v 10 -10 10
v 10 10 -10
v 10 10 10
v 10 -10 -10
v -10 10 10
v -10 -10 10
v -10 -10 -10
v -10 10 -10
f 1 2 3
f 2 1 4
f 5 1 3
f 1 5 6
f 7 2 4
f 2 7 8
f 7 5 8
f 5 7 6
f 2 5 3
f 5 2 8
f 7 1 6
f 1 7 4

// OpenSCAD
// Filename : Robot-2.scad
// Version  : v2.0
// Modified : 3 Sept 2016
// Author   : Jason Yeo
//////////////////////////////////////
// Basic car frame. (Base class)
//////////////////////////////////////
$fn=60;
robot();

module robot()
{
    head();
    //torso();
    //arms();
    //hsips();
    //legs();
}

//////////////////////////////////////////////////////////
// HEAD
//////////////////////////////////////////////////////////
module head(length=20, breadth=20, height=20)
{
    union()
    {
        cube([length, breadth, height],true);
        //rotate([90,0,0])cylinder(20,10,10, true);
        eye();
        //ears();
        //nose();      
        //translate([0,-6,10]) mouth();
        //translate([0,-15,0]) rotate([90,0,0])cylinder(10,4,3, true);
    }
}
module eye()
{
    difference()
    {
        cylinder(3,3,3, true);
        cylinder(3,2,2, true);
    }
}
module ears()
{
    translate([10,0,0])sphere(5);
    translate([-10,0,0])sphere(5);
}
module nose()
{
    translate([0,-2,8]) rotate([0,0,0]) cylinder(8,2,1, true);
}
module mouth()
{
    difference()
    {
        cube([10,4,3], true);
        cube([8,3,3], true);
    }
}
//////////////////////////////////////////////////////////
// TORSO
//////////////////////////////////////////////////////////
module torso()
{
    translate([0,-40,0]) rotate([90,0,0]) cylinder(40,20,20, true, $fn=80);
}
//////////////////////////////////////////////////////////
// ARMS
//////////////////////////////////////////////////////////
module arms()
{
}
//////////////////////////////////////////////////////////
// HIPS
//////////////////////////////////////////////////////////
module hips()
{
}
//////////////////////////////////////////////////////////
// LEGS
//////////////////////////////////////////////////////////
module legs()
{
}
//////////////////////////////////////////////////////////
